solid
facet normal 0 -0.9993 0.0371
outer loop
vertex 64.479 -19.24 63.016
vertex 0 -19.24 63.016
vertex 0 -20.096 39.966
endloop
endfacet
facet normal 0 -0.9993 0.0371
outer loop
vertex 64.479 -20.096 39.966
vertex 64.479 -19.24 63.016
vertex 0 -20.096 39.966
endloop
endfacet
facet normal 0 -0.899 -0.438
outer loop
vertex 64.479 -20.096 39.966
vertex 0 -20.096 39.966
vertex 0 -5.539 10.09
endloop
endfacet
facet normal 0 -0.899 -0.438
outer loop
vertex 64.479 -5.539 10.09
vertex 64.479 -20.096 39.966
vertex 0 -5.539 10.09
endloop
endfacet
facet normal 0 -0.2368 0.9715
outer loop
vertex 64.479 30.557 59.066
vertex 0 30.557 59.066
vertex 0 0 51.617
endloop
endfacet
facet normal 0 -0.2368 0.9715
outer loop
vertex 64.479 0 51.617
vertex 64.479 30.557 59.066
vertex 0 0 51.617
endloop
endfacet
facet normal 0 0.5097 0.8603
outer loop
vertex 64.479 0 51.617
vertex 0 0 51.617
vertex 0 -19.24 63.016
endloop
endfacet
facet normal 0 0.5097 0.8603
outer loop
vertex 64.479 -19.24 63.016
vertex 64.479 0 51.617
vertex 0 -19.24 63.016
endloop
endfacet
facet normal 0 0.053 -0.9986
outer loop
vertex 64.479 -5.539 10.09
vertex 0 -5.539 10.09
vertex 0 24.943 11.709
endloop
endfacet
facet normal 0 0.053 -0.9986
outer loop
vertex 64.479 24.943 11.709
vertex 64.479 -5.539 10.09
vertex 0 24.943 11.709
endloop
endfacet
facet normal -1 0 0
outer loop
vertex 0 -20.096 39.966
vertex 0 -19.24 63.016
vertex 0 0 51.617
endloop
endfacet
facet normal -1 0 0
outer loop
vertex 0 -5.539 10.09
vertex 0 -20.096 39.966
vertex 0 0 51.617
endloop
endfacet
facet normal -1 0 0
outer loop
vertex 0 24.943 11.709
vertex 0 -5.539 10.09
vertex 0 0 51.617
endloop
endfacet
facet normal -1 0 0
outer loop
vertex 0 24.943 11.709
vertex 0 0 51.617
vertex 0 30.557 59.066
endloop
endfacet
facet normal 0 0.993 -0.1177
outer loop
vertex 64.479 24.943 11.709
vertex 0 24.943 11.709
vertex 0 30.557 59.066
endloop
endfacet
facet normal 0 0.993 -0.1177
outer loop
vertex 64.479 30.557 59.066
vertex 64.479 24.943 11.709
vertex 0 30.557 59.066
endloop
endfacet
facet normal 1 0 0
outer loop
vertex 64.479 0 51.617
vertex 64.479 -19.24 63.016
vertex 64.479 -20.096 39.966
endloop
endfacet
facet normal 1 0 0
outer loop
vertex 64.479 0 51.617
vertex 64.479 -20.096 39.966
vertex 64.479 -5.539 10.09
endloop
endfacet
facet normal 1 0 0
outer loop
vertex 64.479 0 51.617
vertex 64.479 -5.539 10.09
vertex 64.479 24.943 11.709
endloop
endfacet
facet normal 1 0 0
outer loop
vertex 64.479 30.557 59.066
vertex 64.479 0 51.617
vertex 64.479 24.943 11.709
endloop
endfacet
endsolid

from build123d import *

# Parameters (mm, degrees)
F2_DEPTH = 64.478658


with BuildPart() as f2:
    # F1 (on face) → F2 (new body)
    with BuildSketch(Plane.YZ):
        Polygon((30.557144, 59.066296), (0, 51.617414), (-19.239661, 63.016182), (-20.095591, 39.965741), (-5.539023, 10.089733), (24.94307, 11.708565), align=None)
    extrude(amount=F2_DEPTH)


solid = f2.part
